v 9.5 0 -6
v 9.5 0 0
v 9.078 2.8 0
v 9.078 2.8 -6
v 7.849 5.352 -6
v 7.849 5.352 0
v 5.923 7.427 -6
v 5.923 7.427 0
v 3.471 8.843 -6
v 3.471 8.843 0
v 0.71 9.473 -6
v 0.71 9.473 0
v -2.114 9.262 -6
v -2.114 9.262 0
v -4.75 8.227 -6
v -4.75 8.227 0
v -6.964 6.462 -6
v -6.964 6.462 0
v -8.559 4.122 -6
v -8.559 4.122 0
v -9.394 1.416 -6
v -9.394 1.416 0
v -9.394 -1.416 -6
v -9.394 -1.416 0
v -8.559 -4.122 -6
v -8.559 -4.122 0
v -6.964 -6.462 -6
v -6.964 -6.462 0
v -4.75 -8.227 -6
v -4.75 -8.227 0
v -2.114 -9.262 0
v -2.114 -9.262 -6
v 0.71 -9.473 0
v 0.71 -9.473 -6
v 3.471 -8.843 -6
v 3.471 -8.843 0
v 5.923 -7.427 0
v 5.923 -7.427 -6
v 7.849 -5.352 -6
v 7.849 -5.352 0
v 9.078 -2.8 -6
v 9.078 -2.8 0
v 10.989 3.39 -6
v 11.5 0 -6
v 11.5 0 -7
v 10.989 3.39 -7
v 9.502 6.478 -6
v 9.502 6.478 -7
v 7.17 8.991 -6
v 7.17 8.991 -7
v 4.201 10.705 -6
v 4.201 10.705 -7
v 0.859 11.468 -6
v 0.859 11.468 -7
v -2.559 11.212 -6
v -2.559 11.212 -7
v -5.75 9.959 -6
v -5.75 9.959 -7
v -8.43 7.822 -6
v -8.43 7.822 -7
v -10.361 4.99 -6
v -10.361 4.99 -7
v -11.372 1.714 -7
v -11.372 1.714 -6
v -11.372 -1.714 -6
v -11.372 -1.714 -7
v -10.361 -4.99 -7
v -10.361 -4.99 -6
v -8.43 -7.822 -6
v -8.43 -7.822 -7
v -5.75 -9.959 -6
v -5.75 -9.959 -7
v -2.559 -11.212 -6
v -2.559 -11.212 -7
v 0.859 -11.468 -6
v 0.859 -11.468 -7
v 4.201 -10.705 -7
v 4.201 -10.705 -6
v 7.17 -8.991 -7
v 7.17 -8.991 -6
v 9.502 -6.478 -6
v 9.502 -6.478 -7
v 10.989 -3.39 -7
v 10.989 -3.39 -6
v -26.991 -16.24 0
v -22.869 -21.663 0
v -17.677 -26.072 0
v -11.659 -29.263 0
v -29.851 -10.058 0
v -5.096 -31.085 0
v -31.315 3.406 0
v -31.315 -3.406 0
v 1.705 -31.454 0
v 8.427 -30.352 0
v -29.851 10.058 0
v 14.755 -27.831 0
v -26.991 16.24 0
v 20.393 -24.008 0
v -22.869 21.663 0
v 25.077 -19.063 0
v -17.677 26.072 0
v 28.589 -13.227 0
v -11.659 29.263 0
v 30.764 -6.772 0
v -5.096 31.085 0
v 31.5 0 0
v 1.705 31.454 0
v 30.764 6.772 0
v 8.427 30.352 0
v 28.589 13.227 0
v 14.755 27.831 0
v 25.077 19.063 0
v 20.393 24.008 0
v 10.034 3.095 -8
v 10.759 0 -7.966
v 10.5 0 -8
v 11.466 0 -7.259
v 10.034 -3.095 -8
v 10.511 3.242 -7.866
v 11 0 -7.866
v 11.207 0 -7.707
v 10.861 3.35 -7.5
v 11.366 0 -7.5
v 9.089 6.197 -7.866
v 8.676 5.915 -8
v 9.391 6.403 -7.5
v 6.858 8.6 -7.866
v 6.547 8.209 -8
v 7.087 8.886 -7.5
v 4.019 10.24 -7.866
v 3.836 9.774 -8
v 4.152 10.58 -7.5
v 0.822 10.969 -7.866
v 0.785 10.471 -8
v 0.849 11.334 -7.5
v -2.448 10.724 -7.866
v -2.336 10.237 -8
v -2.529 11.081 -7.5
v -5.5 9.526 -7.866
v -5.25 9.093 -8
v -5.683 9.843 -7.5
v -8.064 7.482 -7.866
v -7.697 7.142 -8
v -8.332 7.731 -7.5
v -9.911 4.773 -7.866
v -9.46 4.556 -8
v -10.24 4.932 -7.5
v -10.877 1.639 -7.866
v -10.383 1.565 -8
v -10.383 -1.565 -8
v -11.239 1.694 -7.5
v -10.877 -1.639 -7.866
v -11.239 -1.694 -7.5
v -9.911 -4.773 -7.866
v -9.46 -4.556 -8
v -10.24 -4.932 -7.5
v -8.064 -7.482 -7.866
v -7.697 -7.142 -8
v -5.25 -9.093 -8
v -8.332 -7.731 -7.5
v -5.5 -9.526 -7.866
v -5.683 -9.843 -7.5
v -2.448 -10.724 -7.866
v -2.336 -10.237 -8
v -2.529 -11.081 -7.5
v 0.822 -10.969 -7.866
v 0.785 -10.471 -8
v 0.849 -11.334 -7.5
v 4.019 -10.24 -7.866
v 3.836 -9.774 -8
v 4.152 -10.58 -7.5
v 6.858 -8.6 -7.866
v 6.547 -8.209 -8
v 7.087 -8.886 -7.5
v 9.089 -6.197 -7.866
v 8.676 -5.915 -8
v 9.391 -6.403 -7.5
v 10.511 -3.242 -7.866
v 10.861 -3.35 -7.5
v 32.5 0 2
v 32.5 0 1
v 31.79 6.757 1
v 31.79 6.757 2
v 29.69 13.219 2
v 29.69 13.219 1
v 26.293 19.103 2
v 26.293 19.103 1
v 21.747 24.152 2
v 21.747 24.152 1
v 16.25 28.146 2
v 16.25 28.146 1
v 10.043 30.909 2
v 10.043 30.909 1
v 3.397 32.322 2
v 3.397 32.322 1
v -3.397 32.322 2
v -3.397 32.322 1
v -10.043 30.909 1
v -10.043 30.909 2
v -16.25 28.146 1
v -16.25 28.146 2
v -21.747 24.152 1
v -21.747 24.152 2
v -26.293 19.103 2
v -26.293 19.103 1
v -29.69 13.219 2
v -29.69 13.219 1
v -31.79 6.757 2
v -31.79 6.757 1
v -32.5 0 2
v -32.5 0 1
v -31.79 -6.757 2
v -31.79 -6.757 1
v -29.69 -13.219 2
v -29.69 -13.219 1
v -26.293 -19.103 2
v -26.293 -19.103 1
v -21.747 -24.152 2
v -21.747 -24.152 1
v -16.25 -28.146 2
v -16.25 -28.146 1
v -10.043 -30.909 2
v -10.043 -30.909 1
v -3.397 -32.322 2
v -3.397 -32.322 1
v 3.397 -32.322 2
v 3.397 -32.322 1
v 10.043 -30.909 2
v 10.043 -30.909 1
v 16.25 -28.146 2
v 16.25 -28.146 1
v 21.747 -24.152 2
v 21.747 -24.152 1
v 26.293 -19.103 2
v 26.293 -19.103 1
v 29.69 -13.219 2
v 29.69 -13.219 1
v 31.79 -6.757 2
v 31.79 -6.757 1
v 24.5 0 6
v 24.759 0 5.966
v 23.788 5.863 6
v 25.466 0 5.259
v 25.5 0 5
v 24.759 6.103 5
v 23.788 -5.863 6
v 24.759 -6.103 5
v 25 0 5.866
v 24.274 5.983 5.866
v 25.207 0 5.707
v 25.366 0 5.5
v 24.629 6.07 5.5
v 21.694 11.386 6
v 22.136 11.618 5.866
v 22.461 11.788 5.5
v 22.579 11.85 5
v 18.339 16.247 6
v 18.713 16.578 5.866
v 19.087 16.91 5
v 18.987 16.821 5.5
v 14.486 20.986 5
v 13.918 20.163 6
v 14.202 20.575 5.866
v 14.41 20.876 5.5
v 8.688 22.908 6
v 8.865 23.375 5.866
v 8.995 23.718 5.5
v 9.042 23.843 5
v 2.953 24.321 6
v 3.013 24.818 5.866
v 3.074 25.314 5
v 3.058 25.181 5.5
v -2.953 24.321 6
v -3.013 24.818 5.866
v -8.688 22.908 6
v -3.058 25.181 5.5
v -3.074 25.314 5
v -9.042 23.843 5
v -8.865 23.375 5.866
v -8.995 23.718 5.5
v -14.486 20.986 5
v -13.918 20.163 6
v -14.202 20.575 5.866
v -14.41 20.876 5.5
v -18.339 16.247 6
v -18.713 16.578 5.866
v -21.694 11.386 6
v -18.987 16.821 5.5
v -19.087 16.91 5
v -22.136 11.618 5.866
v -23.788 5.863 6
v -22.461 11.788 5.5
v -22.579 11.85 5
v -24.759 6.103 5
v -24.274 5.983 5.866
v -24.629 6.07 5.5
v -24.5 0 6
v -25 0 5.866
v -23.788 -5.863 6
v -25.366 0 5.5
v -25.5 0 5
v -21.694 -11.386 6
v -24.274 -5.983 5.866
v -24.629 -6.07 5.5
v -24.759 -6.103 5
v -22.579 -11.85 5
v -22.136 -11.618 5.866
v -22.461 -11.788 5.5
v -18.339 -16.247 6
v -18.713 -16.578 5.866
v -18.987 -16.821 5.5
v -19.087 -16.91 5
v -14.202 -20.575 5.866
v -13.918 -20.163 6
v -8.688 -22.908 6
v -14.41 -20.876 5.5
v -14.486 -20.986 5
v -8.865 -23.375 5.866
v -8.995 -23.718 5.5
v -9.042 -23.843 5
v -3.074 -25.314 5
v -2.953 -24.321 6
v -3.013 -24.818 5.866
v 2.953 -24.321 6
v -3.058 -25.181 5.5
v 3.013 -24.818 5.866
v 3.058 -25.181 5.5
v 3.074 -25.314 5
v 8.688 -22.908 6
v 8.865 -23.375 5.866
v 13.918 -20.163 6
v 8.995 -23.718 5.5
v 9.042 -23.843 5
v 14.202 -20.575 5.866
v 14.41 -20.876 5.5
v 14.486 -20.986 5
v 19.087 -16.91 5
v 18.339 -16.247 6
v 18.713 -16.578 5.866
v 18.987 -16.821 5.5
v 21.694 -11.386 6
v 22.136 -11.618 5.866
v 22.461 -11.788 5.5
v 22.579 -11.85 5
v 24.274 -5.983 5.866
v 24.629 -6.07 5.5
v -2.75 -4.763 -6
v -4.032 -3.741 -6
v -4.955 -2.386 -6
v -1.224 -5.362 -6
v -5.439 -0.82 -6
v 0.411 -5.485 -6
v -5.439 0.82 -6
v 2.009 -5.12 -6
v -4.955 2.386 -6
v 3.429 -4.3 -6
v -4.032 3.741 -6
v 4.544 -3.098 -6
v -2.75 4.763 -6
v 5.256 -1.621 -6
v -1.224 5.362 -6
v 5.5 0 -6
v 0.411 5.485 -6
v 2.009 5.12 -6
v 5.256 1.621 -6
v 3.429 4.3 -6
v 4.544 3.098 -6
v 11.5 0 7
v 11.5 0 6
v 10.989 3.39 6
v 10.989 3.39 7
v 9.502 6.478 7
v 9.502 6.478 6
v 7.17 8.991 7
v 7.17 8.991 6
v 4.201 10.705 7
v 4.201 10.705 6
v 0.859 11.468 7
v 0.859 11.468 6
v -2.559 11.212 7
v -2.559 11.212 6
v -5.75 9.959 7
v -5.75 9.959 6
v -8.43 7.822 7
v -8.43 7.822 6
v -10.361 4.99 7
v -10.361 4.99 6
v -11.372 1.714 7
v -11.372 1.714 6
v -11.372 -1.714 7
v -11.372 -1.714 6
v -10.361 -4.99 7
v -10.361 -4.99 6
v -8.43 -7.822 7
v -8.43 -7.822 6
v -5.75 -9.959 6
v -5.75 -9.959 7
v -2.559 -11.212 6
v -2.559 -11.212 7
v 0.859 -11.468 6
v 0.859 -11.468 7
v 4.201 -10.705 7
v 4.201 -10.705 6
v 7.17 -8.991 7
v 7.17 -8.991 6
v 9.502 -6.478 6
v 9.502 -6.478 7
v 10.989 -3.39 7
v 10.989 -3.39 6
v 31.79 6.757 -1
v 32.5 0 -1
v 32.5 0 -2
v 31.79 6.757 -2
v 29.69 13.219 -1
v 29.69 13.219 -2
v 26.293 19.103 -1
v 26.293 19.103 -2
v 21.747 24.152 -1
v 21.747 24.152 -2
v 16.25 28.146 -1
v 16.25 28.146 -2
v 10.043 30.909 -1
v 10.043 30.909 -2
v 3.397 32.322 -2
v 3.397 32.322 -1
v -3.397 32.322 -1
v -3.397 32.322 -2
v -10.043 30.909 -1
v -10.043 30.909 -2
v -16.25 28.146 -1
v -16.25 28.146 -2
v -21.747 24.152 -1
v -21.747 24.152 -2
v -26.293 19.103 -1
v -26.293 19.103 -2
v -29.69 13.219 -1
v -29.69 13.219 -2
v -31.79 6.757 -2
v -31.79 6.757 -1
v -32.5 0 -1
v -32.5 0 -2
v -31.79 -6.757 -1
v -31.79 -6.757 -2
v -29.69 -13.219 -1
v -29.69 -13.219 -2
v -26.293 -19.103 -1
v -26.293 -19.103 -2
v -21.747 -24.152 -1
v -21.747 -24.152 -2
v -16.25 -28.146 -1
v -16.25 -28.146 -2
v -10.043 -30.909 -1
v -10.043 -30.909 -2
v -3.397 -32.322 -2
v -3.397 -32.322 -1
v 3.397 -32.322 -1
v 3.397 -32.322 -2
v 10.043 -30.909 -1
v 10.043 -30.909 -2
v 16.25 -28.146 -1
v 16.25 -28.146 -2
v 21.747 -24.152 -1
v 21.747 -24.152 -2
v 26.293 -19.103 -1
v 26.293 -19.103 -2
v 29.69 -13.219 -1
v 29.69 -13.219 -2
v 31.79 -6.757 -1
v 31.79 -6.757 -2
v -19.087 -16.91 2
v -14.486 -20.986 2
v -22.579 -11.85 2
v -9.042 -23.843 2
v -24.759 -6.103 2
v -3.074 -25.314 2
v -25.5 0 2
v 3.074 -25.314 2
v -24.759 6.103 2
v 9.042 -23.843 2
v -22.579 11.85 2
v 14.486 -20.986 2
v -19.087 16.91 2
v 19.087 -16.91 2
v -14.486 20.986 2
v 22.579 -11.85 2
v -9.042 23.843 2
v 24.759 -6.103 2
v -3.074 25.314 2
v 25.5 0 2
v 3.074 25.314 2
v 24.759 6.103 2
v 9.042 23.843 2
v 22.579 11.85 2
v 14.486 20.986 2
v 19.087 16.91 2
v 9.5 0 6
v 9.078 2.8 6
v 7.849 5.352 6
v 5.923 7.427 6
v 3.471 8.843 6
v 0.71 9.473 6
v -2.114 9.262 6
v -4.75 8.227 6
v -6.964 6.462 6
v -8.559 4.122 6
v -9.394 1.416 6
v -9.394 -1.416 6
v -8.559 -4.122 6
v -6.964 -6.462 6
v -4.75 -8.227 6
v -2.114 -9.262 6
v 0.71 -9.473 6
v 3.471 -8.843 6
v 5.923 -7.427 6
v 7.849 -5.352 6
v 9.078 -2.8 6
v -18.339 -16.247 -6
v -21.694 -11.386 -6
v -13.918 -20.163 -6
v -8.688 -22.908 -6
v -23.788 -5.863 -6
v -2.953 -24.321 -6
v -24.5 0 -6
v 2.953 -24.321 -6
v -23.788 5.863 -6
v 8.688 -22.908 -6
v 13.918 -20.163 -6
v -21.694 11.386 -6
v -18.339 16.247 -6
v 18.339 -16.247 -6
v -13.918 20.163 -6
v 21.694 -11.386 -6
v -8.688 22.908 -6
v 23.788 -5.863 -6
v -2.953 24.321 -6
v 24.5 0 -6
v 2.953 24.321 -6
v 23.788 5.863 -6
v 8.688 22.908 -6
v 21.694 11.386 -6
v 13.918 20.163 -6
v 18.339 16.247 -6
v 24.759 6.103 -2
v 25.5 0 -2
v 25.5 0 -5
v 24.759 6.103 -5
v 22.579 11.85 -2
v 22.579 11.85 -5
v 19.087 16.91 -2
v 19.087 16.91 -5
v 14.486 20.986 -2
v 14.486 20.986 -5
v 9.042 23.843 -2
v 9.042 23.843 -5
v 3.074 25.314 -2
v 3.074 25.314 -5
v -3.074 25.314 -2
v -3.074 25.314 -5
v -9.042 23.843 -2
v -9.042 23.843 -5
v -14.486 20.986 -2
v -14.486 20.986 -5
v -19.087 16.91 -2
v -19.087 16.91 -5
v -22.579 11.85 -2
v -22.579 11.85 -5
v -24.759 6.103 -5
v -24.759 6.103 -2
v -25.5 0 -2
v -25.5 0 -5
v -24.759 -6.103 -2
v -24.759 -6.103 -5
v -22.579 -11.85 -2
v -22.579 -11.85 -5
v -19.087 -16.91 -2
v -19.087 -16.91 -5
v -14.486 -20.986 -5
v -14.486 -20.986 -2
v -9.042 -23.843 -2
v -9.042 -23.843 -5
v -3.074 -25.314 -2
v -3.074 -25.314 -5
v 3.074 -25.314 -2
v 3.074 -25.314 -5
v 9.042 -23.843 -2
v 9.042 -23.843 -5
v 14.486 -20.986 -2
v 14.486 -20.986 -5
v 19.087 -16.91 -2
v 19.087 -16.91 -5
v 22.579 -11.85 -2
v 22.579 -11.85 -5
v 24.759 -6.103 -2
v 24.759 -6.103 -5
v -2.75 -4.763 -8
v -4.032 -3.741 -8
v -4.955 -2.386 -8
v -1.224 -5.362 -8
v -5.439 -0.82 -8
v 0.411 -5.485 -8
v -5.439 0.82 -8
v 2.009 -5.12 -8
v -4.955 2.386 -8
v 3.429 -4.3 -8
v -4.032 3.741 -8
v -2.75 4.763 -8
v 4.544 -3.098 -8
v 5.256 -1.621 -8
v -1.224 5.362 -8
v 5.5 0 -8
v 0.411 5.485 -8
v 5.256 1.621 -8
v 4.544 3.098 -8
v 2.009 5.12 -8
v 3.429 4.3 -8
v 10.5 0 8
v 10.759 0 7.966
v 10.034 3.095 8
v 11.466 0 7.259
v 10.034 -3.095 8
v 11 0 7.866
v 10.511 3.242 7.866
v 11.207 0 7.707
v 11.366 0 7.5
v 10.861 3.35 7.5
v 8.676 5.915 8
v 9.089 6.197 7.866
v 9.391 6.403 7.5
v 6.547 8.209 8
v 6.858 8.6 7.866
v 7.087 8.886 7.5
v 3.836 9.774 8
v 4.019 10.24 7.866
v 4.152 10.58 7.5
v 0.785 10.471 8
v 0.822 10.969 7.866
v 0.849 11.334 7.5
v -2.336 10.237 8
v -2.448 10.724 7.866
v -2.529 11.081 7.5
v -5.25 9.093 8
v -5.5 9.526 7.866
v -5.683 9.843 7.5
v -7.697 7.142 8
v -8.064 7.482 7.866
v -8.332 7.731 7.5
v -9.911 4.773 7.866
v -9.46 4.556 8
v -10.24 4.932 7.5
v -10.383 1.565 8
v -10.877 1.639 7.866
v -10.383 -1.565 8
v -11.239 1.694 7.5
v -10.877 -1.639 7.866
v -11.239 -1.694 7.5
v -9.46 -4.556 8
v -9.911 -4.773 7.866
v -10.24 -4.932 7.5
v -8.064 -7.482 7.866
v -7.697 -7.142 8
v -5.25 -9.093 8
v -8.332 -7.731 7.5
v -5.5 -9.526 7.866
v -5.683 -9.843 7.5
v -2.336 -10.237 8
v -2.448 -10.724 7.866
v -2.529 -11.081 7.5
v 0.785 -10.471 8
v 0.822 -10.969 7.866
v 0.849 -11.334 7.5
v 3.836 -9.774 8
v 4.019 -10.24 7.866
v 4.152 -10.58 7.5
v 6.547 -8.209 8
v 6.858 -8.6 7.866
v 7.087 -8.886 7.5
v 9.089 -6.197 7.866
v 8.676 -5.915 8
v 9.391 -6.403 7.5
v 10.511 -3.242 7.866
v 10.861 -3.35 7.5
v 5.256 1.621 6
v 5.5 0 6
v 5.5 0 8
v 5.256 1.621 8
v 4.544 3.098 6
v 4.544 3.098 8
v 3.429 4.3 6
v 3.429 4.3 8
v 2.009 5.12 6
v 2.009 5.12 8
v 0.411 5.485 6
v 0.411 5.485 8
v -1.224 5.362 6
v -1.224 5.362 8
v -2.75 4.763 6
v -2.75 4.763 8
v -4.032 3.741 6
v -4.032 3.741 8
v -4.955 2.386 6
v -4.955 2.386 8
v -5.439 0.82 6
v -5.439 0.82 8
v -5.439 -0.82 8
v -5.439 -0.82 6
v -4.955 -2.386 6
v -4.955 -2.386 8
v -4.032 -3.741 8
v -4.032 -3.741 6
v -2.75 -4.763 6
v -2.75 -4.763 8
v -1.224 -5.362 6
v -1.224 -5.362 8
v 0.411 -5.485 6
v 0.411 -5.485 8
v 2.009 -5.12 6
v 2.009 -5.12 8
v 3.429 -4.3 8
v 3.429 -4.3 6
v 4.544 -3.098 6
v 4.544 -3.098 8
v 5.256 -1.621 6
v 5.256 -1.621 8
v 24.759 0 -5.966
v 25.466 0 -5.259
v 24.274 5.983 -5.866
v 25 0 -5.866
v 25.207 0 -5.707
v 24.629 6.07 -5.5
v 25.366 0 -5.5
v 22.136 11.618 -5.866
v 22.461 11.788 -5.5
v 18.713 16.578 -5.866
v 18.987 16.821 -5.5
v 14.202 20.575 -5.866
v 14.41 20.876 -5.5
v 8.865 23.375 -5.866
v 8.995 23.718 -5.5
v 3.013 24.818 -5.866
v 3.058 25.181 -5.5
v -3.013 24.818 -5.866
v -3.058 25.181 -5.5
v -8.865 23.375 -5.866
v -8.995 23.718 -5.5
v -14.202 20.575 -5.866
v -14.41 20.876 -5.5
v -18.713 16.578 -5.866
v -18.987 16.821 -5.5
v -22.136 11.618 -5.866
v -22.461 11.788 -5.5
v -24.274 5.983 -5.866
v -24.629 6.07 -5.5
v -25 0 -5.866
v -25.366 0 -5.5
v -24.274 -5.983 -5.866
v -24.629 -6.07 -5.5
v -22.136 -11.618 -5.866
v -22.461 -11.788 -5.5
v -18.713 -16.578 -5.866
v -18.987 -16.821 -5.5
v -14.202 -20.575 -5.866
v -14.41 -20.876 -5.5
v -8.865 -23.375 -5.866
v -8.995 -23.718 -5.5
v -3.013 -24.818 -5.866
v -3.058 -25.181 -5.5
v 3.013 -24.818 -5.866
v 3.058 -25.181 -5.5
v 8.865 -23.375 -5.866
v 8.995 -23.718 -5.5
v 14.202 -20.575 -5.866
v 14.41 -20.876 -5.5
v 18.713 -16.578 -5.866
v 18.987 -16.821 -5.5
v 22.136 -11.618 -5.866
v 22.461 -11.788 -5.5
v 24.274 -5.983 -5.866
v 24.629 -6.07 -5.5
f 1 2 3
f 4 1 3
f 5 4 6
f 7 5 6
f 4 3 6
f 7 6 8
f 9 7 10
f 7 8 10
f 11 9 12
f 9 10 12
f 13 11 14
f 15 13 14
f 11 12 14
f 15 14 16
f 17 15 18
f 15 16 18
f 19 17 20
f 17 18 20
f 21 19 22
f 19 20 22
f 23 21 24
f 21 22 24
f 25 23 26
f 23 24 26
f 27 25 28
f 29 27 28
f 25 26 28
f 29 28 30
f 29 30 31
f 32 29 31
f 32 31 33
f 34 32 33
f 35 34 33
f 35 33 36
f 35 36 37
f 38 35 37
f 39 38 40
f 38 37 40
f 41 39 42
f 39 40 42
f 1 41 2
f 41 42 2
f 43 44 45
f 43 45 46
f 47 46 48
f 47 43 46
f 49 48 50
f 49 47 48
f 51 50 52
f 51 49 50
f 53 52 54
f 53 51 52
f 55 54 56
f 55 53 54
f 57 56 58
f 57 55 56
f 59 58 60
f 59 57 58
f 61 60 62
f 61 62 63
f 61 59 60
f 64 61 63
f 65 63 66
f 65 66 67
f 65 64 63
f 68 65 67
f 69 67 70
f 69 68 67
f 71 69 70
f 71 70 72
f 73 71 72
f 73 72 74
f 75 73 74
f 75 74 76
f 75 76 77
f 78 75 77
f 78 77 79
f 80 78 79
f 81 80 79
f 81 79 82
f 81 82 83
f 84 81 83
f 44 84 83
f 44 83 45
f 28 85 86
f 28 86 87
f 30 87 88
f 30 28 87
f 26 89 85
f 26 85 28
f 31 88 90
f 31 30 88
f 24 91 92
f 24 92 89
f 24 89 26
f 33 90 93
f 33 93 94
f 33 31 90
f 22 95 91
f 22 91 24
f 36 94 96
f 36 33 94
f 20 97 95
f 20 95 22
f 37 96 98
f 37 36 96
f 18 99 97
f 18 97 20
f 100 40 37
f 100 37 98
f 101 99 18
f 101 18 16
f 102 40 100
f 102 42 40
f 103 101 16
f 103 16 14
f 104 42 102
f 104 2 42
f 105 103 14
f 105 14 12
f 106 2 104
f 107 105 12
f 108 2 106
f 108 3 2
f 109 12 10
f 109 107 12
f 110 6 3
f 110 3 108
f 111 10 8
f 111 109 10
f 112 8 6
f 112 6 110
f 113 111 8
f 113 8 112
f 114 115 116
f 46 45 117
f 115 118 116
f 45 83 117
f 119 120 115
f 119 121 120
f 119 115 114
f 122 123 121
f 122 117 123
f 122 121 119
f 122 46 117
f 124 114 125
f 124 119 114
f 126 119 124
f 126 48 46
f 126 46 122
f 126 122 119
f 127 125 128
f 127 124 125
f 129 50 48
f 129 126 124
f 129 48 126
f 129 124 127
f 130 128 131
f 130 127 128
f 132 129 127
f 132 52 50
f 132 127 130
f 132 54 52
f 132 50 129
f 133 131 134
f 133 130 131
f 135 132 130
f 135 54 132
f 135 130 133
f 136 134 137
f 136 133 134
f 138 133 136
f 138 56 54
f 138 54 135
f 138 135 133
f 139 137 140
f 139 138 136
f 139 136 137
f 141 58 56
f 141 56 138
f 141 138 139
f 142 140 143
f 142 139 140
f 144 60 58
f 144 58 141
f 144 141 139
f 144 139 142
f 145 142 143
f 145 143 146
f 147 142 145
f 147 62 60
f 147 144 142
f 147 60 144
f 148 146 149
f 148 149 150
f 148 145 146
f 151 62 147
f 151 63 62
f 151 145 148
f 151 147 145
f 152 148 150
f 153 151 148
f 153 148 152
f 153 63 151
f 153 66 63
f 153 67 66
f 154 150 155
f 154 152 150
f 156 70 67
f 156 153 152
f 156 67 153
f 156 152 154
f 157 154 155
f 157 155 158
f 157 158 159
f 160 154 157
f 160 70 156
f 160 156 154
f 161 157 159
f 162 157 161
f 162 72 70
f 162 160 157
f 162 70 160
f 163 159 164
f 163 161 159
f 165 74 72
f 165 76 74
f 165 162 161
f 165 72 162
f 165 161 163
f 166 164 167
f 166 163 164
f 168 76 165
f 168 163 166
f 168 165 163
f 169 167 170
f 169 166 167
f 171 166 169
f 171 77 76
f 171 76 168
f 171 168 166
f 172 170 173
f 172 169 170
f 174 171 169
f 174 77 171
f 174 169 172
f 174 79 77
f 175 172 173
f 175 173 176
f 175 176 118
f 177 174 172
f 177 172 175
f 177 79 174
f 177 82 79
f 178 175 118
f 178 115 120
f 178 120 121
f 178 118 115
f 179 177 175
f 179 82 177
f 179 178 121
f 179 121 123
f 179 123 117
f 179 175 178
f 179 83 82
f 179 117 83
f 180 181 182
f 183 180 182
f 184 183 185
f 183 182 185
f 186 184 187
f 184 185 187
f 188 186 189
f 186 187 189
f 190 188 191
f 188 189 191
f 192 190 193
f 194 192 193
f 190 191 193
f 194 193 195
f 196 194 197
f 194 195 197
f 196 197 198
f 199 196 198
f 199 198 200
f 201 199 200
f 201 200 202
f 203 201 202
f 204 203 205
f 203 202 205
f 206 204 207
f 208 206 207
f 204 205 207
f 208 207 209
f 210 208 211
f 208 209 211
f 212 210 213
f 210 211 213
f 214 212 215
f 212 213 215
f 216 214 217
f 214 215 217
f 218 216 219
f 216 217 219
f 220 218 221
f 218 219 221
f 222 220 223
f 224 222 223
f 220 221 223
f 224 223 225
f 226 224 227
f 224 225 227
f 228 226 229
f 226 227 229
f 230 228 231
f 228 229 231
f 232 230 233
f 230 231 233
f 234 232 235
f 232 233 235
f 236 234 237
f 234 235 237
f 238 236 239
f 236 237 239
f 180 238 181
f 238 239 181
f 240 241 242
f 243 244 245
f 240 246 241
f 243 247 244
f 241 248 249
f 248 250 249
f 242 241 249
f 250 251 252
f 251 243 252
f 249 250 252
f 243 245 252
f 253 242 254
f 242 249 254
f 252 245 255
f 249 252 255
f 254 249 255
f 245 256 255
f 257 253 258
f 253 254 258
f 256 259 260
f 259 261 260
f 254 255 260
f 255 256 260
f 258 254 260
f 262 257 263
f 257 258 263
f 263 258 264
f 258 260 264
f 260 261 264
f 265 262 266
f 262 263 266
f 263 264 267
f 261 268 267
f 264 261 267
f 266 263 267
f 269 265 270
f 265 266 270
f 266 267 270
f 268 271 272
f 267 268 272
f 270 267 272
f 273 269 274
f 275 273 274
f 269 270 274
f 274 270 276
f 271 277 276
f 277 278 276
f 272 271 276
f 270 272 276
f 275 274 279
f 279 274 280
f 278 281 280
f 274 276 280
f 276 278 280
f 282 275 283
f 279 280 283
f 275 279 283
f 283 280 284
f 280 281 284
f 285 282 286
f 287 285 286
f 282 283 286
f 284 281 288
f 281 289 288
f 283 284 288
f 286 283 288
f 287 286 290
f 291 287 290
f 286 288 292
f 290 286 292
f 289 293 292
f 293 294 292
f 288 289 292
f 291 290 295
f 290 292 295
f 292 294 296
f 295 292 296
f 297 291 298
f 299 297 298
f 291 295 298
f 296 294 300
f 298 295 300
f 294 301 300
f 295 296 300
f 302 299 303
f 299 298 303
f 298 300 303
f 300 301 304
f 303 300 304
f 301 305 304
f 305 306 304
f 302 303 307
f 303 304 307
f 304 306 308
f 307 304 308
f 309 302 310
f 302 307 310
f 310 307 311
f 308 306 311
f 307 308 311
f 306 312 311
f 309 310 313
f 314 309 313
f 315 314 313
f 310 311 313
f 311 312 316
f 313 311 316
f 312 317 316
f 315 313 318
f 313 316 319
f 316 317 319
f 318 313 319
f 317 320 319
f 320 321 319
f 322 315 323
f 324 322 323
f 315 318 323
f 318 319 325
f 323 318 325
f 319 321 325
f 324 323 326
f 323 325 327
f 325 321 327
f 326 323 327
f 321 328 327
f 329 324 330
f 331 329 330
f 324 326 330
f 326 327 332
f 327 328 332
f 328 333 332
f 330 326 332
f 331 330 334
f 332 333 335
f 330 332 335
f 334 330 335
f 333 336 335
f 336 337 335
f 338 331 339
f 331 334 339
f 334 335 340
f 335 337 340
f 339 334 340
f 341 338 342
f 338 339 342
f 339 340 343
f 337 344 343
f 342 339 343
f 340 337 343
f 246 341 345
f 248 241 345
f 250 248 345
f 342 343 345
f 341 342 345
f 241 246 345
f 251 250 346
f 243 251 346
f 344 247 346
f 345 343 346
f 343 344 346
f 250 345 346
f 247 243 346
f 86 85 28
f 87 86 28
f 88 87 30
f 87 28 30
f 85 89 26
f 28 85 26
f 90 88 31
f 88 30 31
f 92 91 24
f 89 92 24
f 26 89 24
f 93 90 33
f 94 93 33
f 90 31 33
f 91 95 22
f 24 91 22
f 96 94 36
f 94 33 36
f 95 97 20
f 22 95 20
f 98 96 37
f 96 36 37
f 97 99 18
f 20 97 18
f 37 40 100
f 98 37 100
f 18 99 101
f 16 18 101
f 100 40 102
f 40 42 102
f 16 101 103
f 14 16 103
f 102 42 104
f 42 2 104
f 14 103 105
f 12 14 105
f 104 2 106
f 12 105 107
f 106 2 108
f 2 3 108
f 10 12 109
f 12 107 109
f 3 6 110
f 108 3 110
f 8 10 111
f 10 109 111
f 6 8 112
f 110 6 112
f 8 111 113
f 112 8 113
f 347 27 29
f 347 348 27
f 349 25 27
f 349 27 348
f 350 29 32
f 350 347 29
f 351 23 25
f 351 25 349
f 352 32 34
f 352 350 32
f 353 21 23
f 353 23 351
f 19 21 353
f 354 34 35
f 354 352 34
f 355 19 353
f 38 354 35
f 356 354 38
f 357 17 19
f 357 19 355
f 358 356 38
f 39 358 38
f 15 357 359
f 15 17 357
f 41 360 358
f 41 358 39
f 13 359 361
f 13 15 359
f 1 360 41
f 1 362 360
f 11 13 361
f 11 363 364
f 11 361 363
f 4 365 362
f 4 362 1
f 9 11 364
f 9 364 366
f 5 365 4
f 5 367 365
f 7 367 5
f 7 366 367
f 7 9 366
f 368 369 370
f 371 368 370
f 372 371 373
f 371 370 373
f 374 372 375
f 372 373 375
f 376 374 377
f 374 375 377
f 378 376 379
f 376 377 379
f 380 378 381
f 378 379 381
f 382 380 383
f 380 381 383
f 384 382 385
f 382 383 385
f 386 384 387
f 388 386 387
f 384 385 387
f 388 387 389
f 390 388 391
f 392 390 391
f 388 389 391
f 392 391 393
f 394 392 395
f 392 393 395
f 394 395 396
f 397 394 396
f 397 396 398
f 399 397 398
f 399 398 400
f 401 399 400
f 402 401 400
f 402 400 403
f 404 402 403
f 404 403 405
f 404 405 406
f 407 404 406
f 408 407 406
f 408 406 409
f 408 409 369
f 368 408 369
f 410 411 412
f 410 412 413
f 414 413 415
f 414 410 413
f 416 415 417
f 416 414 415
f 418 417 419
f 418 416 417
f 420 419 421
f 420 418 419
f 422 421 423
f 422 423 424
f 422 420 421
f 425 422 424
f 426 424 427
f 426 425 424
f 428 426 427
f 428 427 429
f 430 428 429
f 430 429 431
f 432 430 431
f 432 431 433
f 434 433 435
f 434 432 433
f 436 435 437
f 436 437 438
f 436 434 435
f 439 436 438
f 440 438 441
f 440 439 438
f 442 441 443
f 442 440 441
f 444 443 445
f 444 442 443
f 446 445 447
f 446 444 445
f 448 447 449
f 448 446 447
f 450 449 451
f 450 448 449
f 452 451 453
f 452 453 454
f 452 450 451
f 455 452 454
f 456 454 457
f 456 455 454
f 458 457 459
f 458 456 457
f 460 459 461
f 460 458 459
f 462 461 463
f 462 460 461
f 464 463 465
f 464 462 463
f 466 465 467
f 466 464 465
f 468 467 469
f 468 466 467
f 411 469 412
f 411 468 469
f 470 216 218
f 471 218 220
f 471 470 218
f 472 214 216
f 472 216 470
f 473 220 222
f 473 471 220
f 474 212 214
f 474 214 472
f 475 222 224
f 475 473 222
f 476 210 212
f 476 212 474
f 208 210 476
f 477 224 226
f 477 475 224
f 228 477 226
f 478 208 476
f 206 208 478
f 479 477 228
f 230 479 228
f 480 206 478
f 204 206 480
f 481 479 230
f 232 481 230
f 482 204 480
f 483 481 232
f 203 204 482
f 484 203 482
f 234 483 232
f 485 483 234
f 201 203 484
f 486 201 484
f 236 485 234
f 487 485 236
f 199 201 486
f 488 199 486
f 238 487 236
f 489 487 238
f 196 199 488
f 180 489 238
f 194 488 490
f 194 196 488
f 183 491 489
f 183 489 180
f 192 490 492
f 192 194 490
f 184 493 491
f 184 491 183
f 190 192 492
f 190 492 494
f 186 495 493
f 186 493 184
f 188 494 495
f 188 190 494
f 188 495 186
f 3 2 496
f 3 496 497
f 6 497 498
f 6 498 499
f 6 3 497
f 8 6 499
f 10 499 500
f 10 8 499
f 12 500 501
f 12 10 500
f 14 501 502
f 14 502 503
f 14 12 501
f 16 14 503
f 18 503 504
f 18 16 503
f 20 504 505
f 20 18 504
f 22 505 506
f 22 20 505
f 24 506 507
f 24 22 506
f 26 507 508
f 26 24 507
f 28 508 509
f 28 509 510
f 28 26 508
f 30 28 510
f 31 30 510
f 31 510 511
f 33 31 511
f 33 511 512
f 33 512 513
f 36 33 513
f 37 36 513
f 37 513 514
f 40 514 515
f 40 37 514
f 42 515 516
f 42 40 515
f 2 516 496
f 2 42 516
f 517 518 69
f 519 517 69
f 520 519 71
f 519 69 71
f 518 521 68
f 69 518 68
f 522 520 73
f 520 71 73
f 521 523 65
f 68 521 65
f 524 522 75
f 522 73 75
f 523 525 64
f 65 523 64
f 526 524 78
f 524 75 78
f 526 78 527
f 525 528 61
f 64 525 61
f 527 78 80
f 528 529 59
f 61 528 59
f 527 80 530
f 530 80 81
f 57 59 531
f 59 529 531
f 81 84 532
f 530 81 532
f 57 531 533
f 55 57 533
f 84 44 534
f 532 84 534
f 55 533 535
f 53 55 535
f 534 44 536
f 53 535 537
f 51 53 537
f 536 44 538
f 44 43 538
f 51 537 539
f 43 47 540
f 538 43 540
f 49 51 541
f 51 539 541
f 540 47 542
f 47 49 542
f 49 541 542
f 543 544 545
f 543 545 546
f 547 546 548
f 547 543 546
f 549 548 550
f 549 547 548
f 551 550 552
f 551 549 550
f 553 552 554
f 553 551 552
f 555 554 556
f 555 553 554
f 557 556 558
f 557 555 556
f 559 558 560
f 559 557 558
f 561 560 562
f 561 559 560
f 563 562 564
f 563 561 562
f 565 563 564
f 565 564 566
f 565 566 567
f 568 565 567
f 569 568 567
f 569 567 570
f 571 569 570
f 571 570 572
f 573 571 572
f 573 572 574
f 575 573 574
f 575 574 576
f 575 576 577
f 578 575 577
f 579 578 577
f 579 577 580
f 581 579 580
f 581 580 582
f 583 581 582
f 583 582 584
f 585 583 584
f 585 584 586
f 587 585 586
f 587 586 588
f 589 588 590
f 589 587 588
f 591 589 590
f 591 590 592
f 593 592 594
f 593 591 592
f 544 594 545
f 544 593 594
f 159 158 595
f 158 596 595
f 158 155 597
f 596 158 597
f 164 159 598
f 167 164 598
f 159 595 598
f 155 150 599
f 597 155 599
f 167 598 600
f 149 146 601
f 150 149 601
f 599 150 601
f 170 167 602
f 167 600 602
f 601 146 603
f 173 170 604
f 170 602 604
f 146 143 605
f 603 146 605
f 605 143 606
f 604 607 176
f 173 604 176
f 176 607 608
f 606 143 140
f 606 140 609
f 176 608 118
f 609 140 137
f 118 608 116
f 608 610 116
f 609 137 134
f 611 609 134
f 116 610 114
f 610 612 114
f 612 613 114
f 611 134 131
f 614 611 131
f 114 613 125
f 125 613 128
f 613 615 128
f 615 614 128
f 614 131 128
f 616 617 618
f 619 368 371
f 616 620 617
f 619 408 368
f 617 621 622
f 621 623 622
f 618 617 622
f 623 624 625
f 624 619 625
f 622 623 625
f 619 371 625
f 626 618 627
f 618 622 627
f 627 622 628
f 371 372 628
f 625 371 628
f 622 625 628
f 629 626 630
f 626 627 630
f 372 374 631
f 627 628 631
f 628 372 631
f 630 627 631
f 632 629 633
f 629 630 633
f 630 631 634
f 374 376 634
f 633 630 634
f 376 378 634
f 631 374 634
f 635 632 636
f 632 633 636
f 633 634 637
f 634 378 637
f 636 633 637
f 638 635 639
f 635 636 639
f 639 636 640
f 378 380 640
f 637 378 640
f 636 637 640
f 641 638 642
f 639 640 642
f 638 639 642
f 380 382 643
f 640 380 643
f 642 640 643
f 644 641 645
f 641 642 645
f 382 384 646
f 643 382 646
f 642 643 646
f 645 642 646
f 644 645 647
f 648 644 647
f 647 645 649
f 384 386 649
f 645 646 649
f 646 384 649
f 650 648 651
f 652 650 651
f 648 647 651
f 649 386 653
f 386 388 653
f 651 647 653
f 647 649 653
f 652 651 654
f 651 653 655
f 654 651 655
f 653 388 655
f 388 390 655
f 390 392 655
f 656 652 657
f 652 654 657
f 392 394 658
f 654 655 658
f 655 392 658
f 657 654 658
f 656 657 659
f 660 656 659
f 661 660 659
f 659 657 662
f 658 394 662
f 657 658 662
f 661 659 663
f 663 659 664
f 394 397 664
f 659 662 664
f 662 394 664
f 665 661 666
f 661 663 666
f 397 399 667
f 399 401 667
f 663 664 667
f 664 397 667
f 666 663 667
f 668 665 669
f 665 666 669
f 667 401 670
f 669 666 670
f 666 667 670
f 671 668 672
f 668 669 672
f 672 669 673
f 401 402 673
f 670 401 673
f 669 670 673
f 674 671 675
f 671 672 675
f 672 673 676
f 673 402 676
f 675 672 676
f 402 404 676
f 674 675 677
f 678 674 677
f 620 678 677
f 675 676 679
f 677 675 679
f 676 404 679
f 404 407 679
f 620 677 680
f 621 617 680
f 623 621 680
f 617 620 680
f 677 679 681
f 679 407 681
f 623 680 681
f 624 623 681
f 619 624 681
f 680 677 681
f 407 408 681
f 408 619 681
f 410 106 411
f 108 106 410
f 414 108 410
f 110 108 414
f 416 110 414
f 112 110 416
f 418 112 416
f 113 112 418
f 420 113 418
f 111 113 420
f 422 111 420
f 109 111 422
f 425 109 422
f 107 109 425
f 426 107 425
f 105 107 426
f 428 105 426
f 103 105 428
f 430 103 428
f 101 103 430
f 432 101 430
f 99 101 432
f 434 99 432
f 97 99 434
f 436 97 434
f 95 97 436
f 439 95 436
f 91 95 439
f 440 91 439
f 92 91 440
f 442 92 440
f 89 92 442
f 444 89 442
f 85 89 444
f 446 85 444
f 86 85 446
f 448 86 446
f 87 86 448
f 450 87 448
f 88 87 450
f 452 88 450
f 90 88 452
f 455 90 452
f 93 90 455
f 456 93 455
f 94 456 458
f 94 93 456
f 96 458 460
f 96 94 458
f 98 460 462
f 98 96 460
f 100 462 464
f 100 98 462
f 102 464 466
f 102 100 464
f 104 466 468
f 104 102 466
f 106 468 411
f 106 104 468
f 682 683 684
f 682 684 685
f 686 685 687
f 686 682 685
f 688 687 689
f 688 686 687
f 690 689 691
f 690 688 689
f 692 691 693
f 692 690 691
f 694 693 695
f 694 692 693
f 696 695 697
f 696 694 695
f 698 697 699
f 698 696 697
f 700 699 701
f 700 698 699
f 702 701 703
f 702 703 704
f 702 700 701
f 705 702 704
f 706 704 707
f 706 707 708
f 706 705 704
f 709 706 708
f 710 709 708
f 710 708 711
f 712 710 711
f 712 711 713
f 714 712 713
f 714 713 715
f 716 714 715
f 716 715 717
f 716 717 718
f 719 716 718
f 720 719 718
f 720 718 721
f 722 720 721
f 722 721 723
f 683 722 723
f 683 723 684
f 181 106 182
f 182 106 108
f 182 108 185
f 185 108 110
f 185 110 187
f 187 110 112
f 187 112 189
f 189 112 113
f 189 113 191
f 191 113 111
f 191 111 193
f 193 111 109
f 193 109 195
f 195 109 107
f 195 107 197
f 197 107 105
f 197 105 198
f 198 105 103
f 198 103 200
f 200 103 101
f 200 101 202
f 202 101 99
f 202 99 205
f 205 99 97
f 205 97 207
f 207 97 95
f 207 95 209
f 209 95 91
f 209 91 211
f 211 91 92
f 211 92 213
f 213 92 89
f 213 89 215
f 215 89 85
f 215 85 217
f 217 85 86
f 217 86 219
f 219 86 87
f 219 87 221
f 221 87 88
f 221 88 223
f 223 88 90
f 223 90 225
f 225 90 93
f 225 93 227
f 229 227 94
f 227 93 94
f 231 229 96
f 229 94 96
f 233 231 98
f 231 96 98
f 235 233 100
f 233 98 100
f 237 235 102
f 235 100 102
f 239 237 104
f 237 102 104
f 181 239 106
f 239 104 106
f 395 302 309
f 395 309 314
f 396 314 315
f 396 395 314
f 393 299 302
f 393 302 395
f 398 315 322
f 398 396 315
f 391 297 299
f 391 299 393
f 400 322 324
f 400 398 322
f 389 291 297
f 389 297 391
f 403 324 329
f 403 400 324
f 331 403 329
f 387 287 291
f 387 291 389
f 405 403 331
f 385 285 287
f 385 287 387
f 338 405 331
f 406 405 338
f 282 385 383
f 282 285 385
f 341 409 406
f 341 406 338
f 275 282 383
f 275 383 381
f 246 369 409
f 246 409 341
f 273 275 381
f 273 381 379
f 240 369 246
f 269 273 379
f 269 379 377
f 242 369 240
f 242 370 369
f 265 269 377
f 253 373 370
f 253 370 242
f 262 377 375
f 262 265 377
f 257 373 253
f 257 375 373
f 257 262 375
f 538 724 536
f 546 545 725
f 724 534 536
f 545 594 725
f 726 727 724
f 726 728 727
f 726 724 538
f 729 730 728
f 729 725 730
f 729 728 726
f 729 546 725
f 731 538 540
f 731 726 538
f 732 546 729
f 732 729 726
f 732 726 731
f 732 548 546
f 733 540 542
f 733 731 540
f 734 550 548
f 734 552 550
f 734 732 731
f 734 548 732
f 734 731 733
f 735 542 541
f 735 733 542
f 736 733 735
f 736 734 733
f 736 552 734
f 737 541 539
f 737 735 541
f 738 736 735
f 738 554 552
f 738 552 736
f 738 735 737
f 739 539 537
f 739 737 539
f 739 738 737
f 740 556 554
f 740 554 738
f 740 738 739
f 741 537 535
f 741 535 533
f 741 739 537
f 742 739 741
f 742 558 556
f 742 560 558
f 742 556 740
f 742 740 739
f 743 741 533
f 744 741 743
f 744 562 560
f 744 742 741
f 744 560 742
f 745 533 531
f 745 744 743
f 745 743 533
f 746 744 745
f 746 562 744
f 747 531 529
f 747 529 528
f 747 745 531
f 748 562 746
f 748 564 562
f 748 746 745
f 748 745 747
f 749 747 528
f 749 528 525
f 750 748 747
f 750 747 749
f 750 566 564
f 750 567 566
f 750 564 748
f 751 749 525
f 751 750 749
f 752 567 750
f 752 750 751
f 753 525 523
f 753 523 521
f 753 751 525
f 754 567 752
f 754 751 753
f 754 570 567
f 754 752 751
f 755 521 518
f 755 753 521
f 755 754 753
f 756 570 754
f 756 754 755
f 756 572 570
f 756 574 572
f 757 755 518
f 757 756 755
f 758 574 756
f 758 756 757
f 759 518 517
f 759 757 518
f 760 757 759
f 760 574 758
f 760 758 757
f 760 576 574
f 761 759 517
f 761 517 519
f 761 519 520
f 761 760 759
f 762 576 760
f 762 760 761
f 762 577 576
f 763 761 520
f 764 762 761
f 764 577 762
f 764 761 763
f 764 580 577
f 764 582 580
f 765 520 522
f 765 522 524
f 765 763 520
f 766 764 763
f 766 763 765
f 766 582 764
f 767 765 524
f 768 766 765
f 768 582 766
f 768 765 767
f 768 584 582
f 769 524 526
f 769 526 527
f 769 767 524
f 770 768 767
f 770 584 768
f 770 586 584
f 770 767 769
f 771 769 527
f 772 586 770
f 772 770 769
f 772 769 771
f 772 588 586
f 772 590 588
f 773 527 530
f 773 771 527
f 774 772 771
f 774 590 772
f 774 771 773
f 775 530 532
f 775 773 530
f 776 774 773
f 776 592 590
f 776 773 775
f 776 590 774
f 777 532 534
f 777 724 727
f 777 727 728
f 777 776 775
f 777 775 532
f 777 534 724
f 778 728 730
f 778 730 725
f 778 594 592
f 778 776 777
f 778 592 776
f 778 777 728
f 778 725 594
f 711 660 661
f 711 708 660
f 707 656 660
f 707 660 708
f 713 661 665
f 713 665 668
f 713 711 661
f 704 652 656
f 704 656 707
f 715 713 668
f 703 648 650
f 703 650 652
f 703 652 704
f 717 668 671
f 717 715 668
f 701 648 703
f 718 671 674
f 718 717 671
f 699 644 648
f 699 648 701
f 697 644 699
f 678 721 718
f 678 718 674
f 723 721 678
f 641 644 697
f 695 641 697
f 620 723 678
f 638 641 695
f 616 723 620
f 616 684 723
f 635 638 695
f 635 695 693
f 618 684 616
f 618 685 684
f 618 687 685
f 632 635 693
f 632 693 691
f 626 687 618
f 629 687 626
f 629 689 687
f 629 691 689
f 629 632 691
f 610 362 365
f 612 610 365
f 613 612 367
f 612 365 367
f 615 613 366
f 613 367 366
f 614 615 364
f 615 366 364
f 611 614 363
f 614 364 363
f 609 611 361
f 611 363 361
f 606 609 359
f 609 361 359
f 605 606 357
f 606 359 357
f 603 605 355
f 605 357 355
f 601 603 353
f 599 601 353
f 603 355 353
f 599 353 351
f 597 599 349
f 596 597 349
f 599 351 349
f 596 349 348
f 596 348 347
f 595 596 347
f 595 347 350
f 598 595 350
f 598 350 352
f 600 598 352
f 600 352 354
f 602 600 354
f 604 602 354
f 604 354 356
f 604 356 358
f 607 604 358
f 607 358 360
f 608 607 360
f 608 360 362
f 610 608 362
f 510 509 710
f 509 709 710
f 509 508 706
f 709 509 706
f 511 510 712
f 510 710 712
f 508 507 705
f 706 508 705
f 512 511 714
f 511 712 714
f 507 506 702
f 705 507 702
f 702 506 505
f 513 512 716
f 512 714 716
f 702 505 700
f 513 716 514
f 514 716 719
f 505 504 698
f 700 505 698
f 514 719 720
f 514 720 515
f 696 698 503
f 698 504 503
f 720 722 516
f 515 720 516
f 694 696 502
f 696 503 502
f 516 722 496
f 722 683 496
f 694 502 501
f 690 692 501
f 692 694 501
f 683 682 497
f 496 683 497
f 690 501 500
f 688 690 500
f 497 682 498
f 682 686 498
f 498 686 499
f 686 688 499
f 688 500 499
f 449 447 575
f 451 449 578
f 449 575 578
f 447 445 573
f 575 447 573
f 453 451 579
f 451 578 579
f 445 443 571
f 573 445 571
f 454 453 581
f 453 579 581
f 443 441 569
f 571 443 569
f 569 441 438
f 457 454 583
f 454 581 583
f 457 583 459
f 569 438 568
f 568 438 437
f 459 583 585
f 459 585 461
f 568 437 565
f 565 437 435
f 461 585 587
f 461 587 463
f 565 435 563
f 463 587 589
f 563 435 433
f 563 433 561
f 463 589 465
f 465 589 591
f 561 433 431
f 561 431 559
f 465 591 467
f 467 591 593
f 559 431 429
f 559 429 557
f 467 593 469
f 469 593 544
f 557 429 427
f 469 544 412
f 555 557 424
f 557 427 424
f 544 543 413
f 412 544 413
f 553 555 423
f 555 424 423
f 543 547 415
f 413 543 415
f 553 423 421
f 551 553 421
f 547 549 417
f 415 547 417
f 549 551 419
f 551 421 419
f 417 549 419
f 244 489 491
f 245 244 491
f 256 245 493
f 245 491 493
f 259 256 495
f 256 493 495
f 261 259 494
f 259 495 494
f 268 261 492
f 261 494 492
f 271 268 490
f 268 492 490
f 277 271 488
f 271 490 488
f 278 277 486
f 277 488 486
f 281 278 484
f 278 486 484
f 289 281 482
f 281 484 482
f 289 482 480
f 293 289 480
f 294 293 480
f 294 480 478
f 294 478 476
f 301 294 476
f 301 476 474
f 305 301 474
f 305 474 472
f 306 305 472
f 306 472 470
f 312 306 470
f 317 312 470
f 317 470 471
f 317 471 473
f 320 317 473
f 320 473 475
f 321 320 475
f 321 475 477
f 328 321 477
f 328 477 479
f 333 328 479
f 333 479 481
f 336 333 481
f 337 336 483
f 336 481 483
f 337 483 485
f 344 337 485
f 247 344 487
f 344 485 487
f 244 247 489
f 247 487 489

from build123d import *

# Parameters (mm, degrees)
F0_R     = 32.5
F0_R_2   = 25.5
F1_DEPTH = 2
F0_R_3   = 11.5
F2_DEPTH = 6
F0_R_4   = 9.5
F3_DEPTH = 8
F0_R_5   = 5.5
F4_DEPTH = 8
F5_DEPTH = 6
F6_R     = 1
F7_R     = 1
F8_SIZE  = 1


with BuildPart() as f1:
    # F0 (on Top) → F1 (new body)
    with BuildSketch(Plane.XY):
        Circle(F0_R)
        Circle(F0_R_2, mode=Mode.SUBTRACT)
    extrude(amount=F1_DEPTH)

    # F0 (on Top) → F2 (join)
    with BuildSketch(Plane.XY):
        Circle(F0_R_2)
        Circle(F0_R_3, mode=Mode.SUBTRACT)
    extrude(amount=F2_DEPTH)

    # F0 (on Top) → F3 (join)
    with BuildSketch(Plane.XY):
        Circle(F0_R_3)
        Circle(F0_R_4, mode=Mode.SUBTRACT)
    extrude(amount=F3_DEPTH)

    # F0 (on Top) → F4 (join)
    with BuildSketch(Plane.XY):
        Circle(F0_R_4)
        Circle(F0_R_5, mode=Mode.SUBTRACT)
    extrude(amount=F4_DEPTH)

    # F0 (on Top) → F5 (cut)
    with BuildSketch(Plane.XY):
        Circle(F0_R_4)
        Circle(F0_R_5, mode=Mode.SUBTRACT)
    extrude(amount=F5_DEPTH, mode=Mode.SUBTRACT)

    # F6
    f6_edges = [f1.edges().sort_by_distance(p)[0] for p in [
        (-11.5, 0, 8),
    ]]
    fillet(f6_edges, radius=F6_R)

    # F7
    f7_edges = [f1.edges().sort_by_distance(p)[0] for p in [
        (-25.5, 0, 6),
    ]]
    fillet(f7_edges, radius=F7_R)

    # F8
    f8_edges = [f1.edges().sort_by_distance(p)[0] for p in [
        (-32.5, 0, 0),
    ]]
    chamfer(f8_edges, length=F8_SIZE)


with BuildPart() as f9_1:
    # F9: instance of F1
    add(f1.part.mirror(Plane(origin=(0, 0, 0), x_dir=(1, 0, 0), z_dir=(0, 0, -1))))


solid = Compound([f1.part, f9_1.part])
